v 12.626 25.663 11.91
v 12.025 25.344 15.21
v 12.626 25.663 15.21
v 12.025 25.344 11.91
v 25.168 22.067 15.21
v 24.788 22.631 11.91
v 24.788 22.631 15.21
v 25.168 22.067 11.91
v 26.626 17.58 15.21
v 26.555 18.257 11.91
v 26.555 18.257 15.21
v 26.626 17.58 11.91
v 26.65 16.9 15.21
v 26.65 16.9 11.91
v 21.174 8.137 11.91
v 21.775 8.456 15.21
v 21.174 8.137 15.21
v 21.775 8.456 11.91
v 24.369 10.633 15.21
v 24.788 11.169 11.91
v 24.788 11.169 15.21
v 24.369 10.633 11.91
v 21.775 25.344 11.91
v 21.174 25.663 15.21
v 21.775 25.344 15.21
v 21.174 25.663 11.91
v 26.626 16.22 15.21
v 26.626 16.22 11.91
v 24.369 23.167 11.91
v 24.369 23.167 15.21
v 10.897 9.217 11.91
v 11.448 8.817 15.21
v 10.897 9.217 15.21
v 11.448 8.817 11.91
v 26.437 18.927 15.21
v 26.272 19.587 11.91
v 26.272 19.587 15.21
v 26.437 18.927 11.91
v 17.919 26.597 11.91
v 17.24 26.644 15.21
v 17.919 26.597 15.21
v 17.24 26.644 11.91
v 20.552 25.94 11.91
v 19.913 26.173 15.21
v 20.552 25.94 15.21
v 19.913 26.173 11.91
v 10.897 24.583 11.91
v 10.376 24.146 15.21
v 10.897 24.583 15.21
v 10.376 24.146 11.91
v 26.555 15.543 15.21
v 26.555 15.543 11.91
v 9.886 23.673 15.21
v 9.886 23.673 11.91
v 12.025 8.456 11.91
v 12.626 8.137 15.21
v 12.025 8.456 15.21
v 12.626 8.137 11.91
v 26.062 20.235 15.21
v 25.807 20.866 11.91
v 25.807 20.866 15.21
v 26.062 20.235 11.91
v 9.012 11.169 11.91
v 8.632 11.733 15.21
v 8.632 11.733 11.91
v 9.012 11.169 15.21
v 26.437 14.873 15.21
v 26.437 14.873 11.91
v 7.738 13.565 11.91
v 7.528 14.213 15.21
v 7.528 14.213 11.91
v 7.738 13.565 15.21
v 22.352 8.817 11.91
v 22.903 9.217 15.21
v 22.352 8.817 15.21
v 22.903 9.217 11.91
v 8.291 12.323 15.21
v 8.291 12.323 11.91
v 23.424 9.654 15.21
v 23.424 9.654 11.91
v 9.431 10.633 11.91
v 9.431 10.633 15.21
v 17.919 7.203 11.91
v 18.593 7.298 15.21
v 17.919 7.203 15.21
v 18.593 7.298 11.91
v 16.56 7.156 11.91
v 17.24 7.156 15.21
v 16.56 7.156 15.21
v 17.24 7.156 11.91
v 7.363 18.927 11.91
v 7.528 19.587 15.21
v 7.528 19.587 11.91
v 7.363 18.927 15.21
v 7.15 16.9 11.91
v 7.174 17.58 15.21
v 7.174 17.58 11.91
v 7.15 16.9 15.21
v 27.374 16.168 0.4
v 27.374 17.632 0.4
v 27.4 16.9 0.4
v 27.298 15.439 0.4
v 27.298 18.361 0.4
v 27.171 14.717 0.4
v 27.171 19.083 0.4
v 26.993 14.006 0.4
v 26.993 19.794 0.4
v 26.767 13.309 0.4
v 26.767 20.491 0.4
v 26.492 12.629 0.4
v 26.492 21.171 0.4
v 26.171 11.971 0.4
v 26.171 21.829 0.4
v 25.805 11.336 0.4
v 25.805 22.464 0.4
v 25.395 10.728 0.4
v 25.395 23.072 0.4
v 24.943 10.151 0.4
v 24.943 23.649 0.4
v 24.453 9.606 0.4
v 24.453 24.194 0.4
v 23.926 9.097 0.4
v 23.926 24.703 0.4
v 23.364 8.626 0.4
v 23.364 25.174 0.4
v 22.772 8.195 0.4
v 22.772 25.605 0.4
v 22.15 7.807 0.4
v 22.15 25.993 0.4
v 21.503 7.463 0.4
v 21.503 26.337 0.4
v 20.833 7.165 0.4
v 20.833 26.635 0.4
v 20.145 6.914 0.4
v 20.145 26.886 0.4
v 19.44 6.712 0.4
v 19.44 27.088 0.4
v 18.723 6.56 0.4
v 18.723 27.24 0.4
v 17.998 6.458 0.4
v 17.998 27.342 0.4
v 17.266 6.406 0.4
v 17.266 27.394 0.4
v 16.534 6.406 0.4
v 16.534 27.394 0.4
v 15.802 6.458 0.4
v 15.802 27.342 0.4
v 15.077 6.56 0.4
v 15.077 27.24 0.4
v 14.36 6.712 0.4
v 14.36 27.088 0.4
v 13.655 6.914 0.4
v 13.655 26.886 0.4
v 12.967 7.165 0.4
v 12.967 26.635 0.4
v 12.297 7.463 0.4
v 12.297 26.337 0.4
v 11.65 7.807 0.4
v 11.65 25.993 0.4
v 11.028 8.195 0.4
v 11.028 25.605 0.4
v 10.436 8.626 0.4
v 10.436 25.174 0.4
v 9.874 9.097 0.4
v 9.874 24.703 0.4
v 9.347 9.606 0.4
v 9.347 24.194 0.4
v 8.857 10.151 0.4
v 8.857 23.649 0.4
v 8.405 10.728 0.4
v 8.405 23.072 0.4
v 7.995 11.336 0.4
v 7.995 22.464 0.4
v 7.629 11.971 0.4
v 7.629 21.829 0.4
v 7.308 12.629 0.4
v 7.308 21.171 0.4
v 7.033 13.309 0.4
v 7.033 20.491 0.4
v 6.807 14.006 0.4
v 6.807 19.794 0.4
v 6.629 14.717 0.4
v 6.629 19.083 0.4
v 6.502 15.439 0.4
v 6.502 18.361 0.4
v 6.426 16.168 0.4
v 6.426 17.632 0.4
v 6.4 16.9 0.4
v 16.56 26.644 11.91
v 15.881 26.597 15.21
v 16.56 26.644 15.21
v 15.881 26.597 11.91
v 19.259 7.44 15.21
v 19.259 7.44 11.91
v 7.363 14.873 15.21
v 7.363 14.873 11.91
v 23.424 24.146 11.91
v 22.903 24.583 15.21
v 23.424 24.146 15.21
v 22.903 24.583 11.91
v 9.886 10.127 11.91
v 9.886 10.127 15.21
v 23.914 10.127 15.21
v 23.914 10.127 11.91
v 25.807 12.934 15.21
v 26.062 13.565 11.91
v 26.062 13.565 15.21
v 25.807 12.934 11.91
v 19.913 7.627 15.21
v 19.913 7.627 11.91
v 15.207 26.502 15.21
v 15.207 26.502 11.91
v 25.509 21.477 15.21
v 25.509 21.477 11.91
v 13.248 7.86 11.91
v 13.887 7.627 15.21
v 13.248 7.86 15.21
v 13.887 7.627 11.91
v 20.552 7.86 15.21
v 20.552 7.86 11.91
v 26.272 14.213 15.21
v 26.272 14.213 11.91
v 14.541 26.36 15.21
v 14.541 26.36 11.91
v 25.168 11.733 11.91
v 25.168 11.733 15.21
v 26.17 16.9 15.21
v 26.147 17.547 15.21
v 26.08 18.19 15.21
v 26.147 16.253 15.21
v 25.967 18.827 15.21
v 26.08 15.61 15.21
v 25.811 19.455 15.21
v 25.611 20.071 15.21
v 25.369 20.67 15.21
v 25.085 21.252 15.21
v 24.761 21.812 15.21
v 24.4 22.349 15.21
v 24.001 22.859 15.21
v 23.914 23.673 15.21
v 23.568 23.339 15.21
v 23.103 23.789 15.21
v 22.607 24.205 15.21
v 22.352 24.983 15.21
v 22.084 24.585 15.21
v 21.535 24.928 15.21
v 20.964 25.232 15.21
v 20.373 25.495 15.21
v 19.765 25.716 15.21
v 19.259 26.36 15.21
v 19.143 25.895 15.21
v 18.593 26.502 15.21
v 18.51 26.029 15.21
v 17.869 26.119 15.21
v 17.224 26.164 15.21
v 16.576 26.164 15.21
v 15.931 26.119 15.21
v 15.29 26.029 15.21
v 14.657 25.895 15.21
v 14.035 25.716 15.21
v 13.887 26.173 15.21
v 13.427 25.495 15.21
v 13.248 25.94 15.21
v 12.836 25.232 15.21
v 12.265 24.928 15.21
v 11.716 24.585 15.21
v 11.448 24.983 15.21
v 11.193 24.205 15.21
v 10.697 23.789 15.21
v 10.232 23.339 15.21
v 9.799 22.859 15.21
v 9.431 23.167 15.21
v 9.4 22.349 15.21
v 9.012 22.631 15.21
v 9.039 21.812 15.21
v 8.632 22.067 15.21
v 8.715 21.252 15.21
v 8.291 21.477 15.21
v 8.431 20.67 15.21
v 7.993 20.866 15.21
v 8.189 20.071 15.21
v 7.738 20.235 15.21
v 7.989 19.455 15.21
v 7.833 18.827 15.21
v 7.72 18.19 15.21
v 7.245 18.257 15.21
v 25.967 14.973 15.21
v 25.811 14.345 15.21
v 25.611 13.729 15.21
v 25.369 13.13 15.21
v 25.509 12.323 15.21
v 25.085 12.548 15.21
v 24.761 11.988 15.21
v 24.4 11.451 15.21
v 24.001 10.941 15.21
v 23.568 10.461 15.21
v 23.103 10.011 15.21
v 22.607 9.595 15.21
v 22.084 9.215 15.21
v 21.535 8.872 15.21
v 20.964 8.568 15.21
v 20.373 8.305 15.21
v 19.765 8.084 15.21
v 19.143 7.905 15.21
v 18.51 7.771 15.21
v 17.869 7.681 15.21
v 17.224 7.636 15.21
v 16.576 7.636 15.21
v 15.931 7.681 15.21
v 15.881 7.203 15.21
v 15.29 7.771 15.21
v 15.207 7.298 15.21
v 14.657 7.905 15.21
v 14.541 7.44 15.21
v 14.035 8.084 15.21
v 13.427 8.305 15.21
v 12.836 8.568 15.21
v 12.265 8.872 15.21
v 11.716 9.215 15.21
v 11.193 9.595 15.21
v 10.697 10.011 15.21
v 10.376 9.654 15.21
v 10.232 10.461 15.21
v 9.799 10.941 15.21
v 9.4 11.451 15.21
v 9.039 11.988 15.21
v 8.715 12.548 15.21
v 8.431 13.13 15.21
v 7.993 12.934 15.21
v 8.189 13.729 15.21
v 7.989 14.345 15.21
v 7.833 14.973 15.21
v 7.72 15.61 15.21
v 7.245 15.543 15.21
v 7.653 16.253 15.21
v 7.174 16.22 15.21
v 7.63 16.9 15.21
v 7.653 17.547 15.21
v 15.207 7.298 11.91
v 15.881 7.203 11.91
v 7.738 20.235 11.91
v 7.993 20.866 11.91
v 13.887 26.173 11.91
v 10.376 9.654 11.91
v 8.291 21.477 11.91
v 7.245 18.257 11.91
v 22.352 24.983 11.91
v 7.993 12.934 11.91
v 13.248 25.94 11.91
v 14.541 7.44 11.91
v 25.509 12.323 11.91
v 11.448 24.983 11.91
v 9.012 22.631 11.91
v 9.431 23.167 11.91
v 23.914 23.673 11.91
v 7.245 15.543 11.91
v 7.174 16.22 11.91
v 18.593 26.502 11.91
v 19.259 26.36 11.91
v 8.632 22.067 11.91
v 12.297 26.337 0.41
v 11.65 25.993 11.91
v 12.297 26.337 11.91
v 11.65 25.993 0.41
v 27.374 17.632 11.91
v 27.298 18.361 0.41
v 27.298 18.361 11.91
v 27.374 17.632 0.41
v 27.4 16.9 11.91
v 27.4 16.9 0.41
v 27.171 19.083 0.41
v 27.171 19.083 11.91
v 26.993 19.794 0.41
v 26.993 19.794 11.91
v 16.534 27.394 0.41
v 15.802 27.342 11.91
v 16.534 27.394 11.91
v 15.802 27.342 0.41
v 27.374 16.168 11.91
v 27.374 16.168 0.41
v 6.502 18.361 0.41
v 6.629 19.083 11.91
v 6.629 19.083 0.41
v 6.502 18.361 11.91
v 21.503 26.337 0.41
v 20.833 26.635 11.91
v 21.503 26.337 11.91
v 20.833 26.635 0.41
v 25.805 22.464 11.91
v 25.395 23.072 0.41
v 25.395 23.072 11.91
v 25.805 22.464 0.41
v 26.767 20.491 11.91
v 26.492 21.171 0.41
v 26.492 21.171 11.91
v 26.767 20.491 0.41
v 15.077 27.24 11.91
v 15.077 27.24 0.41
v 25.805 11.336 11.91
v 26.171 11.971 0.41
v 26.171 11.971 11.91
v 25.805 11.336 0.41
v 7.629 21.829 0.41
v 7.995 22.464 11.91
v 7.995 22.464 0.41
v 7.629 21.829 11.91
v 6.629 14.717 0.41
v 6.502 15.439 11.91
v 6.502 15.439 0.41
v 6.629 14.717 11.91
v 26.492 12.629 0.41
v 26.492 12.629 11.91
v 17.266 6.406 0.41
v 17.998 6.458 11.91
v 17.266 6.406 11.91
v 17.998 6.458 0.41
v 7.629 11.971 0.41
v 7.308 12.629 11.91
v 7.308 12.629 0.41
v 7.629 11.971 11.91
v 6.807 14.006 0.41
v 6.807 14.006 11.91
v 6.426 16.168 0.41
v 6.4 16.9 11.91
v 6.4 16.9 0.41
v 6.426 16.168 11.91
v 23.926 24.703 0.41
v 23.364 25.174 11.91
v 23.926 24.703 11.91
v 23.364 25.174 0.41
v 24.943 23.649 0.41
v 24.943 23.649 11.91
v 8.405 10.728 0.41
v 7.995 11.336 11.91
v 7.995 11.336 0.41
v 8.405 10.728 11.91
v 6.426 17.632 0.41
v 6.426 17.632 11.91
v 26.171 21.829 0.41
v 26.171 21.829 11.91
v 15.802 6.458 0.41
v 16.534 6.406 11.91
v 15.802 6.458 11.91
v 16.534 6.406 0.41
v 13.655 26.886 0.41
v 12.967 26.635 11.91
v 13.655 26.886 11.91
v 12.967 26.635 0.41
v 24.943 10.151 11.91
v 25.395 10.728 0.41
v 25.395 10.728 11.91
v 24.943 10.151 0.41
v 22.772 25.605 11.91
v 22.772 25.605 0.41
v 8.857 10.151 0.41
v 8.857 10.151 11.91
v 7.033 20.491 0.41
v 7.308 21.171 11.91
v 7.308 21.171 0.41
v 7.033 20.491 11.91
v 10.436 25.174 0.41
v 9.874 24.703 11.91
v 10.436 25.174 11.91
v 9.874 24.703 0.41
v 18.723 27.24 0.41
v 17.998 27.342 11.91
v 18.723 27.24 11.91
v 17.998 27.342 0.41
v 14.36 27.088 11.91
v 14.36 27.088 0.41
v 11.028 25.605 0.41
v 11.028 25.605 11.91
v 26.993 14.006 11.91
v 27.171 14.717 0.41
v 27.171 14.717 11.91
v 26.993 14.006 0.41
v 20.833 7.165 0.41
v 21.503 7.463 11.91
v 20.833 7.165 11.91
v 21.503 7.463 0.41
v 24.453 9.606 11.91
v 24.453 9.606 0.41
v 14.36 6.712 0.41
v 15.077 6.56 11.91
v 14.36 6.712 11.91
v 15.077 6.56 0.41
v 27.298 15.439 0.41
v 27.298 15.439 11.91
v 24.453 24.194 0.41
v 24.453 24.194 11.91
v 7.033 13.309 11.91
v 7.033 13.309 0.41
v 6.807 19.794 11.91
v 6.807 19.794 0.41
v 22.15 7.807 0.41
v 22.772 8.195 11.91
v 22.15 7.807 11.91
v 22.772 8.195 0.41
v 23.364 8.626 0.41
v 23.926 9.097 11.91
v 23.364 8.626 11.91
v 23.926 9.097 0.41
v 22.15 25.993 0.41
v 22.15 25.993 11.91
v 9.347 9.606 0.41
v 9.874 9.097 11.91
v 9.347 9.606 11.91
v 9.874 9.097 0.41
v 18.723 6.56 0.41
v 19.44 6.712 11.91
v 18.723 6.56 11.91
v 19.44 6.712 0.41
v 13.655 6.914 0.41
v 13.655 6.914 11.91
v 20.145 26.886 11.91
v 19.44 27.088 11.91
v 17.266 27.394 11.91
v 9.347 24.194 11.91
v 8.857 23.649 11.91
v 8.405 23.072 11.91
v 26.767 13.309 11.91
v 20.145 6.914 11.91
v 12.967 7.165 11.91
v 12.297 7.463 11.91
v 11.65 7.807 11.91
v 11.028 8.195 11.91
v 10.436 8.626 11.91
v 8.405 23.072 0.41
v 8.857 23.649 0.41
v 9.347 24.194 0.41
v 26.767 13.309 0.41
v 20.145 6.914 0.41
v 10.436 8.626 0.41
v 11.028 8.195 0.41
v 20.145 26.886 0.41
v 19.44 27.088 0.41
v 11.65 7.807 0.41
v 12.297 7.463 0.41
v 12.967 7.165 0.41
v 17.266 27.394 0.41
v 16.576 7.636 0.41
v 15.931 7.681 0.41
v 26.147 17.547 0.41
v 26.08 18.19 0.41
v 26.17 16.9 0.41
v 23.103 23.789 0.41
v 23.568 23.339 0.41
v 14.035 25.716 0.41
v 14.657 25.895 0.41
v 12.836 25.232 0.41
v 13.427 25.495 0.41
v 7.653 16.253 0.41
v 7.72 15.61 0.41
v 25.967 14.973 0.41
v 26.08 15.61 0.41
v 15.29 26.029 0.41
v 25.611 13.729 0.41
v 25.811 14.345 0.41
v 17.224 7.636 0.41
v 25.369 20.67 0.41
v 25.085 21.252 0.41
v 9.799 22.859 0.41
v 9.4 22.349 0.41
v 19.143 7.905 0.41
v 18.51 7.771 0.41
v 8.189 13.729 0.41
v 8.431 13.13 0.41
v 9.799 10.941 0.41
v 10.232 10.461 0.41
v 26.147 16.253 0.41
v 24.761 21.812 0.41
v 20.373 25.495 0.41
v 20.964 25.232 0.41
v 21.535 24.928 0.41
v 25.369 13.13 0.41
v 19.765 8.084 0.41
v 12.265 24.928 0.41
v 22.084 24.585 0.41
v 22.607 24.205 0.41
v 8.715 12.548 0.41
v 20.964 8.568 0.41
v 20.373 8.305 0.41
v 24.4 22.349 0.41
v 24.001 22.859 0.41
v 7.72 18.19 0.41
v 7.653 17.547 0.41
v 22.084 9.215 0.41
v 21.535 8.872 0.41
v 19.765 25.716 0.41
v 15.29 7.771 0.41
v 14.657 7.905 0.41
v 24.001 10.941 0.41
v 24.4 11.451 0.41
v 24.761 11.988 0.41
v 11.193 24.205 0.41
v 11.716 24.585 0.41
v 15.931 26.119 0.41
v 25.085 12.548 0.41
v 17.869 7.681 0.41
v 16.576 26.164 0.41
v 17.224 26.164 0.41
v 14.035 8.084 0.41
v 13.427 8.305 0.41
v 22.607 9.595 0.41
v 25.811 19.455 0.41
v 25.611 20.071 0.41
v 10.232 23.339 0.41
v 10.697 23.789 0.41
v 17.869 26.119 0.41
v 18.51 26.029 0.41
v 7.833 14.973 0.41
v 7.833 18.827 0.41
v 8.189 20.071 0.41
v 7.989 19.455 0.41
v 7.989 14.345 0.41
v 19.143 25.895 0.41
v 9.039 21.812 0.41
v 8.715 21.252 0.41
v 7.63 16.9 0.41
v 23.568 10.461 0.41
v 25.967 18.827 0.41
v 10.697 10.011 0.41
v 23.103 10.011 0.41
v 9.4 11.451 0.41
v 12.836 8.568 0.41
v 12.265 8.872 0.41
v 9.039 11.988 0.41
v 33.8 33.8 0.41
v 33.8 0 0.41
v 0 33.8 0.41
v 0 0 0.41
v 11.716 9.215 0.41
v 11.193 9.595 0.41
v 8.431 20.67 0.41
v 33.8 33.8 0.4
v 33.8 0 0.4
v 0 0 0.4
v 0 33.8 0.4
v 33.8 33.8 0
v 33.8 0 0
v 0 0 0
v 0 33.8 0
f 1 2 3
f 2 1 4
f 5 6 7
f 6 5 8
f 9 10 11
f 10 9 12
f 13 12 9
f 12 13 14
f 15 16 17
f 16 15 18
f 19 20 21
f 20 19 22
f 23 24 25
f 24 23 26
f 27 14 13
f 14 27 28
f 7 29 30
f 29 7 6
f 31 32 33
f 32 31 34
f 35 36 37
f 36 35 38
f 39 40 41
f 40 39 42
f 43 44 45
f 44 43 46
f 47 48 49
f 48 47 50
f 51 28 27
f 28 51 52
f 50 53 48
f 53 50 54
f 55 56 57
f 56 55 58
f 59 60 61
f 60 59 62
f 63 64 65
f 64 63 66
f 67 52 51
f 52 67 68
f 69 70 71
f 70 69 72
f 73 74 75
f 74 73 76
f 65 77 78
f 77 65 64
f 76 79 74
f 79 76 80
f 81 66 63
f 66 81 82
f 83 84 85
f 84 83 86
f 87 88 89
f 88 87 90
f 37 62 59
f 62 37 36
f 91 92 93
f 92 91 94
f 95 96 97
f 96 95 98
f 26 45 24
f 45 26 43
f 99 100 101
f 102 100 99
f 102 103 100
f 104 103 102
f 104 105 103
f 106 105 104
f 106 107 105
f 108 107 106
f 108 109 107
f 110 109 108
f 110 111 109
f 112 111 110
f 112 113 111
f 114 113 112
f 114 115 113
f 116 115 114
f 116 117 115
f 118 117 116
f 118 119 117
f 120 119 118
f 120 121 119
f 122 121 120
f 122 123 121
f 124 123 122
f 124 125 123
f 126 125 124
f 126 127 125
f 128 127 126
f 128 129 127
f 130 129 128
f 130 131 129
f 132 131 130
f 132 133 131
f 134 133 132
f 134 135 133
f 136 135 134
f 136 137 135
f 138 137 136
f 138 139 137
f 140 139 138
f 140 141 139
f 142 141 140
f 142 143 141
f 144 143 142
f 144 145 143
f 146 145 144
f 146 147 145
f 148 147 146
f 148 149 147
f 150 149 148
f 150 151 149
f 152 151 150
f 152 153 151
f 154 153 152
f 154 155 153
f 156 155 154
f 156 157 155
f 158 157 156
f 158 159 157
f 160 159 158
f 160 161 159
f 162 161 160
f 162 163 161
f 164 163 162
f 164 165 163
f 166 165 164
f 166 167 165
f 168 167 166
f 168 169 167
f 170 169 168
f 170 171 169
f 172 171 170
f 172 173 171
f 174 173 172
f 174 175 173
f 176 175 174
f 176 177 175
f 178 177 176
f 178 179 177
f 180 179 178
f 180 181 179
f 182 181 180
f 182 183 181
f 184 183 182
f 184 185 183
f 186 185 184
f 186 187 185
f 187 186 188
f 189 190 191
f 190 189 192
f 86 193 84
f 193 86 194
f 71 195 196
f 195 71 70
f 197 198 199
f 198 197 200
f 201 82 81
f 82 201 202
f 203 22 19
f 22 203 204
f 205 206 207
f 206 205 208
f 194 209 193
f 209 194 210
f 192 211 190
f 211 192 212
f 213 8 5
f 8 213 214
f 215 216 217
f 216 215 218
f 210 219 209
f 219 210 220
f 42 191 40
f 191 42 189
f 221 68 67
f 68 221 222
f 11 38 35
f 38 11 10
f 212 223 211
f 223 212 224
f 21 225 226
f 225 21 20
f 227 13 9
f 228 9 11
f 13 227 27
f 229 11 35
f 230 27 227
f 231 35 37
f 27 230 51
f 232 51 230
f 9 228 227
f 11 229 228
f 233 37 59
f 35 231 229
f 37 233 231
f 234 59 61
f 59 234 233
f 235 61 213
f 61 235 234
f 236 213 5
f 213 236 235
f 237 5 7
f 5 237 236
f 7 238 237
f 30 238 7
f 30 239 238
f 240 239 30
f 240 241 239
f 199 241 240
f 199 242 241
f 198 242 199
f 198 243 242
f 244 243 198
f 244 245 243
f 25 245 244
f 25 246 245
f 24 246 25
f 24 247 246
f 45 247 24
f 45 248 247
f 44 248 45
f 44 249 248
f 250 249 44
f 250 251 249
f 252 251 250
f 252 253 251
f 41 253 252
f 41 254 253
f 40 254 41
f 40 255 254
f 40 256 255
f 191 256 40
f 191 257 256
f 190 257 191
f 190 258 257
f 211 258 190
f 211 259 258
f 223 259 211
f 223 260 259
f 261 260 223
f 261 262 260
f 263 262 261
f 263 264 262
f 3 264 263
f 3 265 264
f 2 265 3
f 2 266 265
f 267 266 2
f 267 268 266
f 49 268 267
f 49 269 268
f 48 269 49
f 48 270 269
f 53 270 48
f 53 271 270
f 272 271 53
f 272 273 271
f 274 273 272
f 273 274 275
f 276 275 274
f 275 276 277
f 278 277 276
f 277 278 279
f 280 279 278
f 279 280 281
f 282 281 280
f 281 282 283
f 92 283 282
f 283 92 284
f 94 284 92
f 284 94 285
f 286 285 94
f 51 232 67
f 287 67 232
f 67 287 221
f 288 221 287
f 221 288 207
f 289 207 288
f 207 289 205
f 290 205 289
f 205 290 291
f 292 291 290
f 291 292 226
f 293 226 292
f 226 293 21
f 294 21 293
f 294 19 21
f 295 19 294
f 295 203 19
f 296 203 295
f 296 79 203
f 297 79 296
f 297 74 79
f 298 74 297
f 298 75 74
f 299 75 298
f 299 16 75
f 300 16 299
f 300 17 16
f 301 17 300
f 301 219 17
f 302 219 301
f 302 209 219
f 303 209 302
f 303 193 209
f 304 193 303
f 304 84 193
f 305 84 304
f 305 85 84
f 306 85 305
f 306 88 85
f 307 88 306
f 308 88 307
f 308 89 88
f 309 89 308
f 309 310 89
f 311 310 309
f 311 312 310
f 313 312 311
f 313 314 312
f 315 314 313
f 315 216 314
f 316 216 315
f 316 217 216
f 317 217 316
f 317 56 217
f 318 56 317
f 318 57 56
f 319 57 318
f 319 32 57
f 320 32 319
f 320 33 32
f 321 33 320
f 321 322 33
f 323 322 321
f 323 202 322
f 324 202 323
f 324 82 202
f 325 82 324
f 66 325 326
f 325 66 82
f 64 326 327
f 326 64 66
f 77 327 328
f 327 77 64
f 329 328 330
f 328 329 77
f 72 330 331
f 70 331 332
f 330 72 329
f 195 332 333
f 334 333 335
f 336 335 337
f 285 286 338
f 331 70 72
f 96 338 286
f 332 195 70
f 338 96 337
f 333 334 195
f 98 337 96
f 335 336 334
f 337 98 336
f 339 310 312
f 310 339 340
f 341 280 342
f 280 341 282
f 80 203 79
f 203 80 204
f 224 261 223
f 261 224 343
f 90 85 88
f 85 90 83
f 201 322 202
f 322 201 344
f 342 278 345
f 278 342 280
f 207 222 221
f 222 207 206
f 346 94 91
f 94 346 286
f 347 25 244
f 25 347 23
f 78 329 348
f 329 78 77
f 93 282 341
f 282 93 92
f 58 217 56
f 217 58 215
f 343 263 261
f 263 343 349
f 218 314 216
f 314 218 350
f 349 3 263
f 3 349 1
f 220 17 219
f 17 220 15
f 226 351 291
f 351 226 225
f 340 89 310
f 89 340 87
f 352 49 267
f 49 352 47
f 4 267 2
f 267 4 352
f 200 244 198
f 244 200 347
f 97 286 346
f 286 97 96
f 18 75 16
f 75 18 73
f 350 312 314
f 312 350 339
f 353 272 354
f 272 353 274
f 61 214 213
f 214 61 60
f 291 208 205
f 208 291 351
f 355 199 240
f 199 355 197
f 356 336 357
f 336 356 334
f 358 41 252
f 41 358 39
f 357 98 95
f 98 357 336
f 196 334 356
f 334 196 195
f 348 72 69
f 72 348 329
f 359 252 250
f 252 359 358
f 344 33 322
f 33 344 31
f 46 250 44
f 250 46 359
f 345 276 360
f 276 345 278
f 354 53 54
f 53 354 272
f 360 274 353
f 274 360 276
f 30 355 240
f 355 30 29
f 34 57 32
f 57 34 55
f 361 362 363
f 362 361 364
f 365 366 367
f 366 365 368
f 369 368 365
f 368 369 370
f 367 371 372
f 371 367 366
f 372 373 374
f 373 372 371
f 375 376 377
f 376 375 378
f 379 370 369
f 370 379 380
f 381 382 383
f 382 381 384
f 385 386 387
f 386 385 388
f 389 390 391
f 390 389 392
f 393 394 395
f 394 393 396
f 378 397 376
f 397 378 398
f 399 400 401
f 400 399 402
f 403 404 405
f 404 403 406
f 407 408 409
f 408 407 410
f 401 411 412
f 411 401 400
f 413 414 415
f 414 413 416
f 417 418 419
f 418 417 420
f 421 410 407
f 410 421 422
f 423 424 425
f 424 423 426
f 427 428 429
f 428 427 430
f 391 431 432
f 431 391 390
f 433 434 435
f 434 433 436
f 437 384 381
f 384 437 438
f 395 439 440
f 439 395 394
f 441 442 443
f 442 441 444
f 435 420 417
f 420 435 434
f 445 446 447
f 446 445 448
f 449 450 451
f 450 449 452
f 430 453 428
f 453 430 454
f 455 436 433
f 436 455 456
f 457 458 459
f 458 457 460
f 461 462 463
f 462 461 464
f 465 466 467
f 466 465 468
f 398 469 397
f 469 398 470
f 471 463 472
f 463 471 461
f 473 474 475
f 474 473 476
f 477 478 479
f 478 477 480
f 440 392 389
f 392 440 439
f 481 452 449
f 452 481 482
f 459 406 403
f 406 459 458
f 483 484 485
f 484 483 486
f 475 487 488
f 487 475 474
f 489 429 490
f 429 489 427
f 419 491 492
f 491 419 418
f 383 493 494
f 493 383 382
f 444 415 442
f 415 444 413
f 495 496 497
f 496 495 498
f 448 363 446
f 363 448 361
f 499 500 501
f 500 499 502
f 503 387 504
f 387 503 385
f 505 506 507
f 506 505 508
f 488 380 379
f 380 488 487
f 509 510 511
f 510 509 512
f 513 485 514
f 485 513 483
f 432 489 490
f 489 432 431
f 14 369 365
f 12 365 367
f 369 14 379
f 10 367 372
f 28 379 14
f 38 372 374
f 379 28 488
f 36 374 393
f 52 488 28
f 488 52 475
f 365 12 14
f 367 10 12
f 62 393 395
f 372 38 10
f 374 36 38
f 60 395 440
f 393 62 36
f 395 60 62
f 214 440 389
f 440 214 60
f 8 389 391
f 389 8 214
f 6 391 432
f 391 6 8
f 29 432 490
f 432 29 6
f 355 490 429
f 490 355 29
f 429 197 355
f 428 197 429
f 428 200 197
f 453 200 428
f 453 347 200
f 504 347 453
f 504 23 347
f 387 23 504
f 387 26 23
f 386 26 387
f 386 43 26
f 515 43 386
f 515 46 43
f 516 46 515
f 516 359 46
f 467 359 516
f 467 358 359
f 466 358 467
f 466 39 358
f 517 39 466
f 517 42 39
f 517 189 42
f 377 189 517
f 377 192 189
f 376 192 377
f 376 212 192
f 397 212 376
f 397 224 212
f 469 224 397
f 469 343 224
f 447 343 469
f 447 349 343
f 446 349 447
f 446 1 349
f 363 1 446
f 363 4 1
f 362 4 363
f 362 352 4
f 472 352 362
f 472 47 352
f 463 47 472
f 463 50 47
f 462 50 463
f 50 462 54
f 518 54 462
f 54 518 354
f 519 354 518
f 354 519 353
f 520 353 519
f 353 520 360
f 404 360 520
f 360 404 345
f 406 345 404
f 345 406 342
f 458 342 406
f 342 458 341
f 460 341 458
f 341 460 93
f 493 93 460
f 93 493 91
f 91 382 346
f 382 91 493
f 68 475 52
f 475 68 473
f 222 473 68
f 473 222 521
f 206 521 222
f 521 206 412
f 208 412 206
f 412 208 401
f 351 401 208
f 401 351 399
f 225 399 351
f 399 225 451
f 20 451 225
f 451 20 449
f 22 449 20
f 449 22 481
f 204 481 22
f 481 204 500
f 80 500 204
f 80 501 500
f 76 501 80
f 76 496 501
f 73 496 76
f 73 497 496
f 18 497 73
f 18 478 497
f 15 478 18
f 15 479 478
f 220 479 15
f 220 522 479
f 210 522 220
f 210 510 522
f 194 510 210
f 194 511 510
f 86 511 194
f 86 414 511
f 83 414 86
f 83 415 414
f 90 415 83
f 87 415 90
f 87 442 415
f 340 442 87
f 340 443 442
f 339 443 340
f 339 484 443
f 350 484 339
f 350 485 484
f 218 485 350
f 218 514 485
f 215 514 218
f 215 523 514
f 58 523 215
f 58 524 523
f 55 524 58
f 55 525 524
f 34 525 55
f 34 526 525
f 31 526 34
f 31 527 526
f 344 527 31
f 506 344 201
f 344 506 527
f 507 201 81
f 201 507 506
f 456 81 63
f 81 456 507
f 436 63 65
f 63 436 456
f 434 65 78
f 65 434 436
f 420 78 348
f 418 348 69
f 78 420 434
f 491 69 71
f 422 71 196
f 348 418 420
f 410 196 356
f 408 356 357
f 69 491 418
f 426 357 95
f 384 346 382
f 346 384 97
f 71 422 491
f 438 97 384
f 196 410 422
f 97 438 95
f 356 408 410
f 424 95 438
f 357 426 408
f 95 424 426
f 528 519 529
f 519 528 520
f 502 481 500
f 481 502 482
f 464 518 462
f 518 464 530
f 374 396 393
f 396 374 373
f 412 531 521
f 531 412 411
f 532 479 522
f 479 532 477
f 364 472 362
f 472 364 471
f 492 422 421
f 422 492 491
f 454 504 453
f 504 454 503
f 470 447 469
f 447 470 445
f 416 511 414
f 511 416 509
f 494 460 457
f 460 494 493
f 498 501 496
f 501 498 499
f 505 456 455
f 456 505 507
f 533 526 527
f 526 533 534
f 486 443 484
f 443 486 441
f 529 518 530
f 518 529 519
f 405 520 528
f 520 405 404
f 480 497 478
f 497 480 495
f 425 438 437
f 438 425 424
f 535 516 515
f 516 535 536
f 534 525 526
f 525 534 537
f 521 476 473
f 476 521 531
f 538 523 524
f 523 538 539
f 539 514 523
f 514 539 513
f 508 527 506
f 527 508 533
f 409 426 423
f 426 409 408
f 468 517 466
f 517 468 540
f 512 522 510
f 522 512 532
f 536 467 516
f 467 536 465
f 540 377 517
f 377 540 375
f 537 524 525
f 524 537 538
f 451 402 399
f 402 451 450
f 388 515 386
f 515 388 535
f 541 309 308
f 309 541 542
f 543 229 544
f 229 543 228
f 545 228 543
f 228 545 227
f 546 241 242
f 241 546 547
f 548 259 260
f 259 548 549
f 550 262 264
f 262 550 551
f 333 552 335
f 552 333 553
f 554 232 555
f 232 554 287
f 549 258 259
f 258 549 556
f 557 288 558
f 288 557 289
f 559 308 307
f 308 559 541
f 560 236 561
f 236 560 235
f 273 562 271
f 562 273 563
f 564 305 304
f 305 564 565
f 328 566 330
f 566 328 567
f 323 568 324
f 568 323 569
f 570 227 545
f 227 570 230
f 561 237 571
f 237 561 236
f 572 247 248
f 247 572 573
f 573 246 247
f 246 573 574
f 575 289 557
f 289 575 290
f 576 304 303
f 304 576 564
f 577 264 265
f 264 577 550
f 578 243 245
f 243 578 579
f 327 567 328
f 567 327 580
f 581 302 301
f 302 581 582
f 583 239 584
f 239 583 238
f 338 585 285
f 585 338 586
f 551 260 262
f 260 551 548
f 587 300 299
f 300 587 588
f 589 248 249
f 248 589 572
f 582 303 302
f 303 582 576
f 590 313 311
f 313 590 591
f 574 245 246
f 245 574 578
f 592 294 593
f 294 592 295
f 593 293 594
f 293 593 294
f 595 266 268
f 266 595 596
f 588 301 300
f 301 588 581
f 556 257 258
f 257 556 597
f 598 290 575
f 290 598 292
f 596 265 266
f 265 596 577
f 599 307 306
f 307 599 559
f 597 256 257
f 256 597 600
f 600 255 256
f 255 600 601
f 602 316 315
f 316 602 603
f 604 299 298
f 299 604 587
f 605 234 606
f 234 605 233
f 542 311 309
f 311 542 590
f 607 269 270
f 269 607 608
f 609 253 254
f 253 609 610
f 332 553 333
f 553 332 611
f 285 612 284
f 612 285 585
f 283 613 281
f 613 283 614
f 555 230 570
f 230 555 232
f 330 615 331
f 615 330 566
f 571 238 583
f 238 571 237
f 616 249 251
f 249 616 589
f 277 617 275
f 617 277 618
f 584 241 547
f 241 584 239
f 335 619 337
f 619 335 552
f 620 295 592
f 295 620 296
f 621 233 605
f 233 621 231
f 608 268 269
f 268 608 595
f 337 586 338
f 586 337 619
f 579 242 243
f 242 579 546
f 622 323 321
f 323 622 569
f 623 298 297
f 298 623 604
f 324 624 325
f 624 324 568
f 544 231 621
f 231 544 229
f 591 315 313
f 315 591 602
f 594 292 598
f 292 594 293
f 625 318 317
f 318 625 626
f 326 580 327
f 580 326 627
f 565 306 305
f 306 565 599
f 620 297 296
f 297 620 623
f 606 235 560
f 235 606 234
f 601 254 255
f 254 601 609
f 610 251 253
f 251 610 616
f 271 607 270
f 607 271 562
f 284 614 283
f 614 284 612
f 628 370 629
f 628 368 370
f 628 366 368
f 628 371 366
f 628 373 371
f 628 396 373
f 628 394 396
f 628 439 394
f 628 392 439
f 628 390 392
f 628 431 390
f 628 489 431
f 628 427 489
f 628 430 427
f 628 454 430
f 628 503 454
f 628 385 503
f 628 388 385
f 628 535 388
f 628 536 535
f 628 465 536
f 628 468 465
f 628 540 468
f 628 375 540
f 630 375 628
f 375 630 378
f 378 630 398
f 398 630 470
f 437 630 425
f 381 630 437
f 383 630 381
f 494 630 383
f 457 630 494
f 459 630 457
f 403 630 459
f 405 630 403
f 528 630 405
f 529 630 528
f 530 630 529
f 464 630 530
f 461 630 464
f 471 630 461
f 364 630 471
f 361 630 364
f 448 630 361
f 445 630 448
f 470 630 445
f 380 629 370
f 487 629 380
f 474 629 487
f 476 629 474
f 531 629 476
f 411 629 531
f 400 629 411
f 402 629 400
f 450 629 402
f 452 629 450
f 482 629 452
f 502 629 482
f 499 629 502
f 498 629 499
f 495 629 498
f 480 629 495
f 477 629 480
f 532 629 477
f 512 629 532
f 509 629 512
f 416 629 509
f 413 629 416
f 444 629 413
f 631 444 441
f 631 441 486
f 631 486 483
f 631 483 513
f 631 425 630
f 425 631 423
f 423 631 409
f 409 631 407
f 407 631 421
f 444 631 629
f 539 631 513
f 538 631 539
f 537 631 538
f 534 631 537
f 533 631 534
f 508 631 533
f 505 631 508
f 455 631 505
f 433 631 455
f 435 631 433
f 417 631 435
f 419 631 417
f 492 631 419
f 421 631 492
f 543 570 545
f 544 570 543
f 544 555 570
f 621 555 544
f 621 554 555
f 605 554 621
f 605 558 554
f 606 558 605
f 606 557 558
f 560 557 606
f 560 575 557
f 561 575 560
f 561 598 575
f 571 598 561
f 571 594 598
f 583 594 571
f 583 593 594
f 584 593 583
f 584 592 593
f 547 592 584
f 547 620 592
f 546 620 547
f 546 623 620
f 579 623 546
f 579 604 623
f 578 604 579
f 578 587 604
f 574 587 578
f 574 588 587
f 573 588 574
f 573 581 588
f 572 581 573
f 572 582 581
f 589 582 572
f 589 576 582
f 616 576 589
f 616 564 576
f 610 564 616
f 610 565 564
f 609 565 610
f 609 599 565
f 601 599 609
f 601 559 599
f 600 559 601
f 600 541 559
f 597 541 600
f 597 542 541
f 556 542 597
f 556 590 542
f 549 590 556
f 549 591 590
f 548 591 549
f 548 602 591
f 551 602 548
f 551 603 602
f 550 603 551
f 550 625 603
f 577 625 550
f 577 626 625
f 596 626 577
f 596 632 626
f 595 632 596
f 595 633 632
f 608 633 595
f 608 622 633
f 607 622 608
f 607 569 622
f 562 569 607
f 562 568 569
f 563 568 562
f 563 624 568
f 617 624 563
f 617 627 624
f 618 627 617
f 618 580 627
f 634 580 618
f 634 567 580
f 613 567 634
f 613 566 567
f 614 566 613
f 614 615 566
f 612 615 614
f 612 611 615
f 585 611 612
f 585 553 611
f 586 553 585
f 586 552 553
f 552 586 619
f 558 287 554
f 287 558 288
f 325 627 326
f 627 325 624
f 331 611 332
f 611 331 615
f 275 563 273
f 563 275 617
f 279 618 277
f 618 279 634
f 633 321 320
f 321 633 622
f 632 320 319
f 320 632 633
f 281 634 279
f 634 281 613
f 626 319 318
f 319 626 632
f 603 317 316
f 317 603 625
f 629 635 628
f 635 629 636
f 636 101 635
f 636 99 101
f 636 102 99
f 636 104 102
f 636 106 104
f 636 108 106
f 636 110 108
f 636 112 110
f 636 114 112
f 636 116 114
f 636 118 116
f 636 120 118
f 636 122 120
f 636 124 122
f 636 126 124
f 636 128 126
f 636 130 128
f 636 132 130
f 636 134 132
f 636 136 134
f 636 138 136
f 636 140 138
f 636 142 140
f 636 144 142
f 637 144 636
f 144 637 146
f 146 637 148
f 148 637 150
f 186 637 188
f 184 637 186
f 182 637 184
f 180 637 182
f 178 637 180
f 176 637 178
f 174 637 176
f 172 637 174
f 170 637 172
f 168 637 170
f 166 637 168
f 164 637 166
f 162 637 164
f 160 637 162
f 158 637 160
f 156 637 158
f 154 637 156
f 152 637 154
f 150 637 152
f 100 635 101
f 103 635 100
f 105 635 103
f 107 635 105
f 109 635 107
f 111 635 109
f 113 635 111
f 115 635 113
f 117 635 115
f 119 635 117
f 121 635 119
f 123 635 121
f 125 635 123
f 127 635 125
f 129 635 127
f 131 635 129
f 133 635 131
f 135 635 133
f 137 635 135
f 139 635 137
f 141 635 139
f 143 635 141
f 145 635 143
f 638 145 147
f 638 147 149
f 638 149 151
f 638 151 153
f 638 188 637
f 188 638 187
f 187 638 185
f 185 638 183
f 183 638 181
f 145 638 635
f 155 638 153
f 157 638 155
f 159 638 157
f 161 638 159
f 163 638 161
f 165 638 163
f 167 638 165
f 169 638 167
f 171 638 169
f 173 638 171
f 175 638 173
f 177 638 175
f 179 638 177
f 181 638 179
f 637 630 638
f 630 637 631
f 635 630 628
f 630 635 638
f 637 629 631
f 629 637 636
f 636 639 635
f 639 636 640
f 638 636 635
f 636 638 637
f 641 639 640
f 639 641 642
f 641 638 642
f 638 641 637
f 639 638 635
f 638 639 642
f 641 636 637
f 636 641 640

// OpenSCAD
// file: ../../Base/PlacementOptions.scad
// Fischertechnik Box Foundation
// Placement Options

// Alignment
NoAlign = 0;
AlignLeft = 1;
AlignBottom = 2;
AlignCenter = 3;
AlignRight = 4;
AlignTop = 5;

// Element rotation degree steps
rotations = [0, -90, -180, -270];

// Rotation
NoRotation = 0;
Rotate0 = 0;
Rotate90 = 1;
Rotate180 = 2;
Rotate270 = 3;

// Docking (seen from above)
NoDock = -1;
DockLeft = 0;
DockTop = 1;
DockRight = 2;
DockCorner = 2;
DockBottom = 3;

// Web corners
LowerLeft = 0;
UpperLeft = 1;
UpperRight = 2;
LowerRight = 3;

// Web position relative to corner
LeftOfCorner = 0;
RightOfCorner = 1;
// file: ../../Base/Boxes.scad
// Fischertechnik Box Foundation
// Pre-designed Boxes

use <Constants.scad>

include <PlacementOptions.scad>

box190Width = 190;
box190Depth = 130;
box130Width = 130;
box130Depth = 95;
boxUsageHeight = 33.9;
boxWallThickness = 2.4;
boxBaseThickness = 1.0;
boxWebWidth = 3.0;

// getBoxWallThickness()
// Gets the wall thickness of a Fischertechnik Box

function getBoxWallThickness() = boxWallThickness;

// Gets the usable height of a fischertechnik box
function getBoxUsageHeight() = boxUsageHeight;

// Gets the thickness of the Fischertechnik box base.
function getBoxBaseThickness() = boxBaseThickness;

// Gets the width of a box web
function getBoxWebWidth() = boxWebWidth;

// Gets the usable inner space of a Box 190 as an x/y-list
function getBox190Space() = [
    box190Width - 2*getBoxWallThickness(), 
    box190Depth - 2*getBoxWallThickness() ];

// Imports the Fischertechnik empty box 130x190 mm and places it at position 0,0
// 190x130 are the outer sizes, the inner space is slightly smaller. Use getBox190Space() to get the inner sizes.
// This module needs the STL file "Fischertechnik Box 130x190.stl" in the library path.
// The box is positioned that the usable inner space is at the 0,0,0 position. The

module Box190() {
    translate([-getBoxWallThickness(),-getBoxWallThickness(),-getBoxBaseThickness()])
        import("Fischertechnik Box 130x190.stl", convexity=3);
}

// Gets the usable inner space of a Box 130 as an x/y-list
function getBox130Space() = [
    box130Width - 2*getBoxWallThickness(), 
    box130Depth - 2*getBoxWallThickness() ];

// Imports the Fischertechnik empty box 95x130 mm and places it at position 0,0
// 190x130 are the outer sizes, the inner space is slightly smaller. Use getBox190Space() to get the inner sizes.
// This module needs the STL file "Fischertechnik Box 95x130.stl" in the library path.
// The box is positioned that the usable inner space is at the 0,0,0 position. The

module Box130() {
    translate([-getBoxWallThickness(),-getBoxWallThickness(),-getBoxBaseThickness()])
        import("Fischertechnik Box 95x130.stl", convexity=3);
}

// Creates a web at the specified box walls
// corner 0 = LowerLeft, 1 = UpperLeft, 2 = UpperRight, 3 = LowerRight
// side 0 = LeftOfCorner, 1 = RightOfCorner
// distance = Distance in mm from the corner
// box = inner width and depth of the box (default: Box 190)
// webWidth = length of the web (default is 3 mms)
// webThickness = thickness of the web (default is 1 mm)

module BoxWeb(corner, side, distance, box=getBox190Space(), webWidth=getBoxWebWidth(), webThickness=1.0) {
    sink = getBoxWallThickness()/2;

    width = (corner % 2 == 0) ? 
            (side == LeftOfCorner ? webWidth : webThickness) :
            (side == LeftOfCorner ? webThickness : webWidth);

    depth = (corner % 2 == 0) ? 
            (side == RightOfCorner ? webWidth : webThickness) :
            (side == RightOfCorner ? webThickness : webWidth);
    
    xDiff = corner == LowerLeft ? 
                (side == LeftOfCorner ? -sink : distance) :
            (corner == UpperLeft ?                
                (side == LeftOfCorner ? distance : -sink) :
            (corner == UpperRight ?
                (side == LeftOfCorner ? box.x-webWidth+sink : box.x-distance-webThickness) :
                (side == LeftOfCorner ? box.x-distance-webThickness: box.x-webWidth+sink)));

    yDiff = corner == LowerLeft ? 
                (side == RightOfCorner ? -sink : distance) :
            (corner == UpperLeft ?
                (side == RightOfCorner ? box.y-distance : box.y-webWidth+sink) :
            (corner == UpperRight ?
                (side == RightOfCorner ? box.y-webWidth+sink : box.y-distance) :
                (side == RightOfCorner ? distance : -sink)));
    
    translate([xDiff, yDiff, -getExcess()])
        cube([width, depth, boxUsageHeight + 2*getExcess()]);
}
// file: ../../Base/Rotation.scad
// Fischertechnik Box Foundation
// Geometry Helpers Rotation

include <PlacementOptions.scad>

// getRotatedSpace(space, rotation=NoRotation)
// Rotates the space dependent on the specified rotation

function getRotatedSpace(space, rotation=NoRotation) = [
    (rotation == Rotate90 || rotation == Rotate270) ? space.y : space.x,
    (rotation == Rotate90 || rotation == Rotate270) ? space.x : space.y
];

// Rotates the given space around the fixed left lower corner
// space = the space the children needs as width/depth list [width,depth]
// rotation = 0 Rotate0 degrees, 1 Rotate90 degrees, 2 Rotate180 degrees, 3 Rotate270 degrees (equivalent to -90)

module RotateFix(space, rotation=Rotate0) {
    dy = (rotation == Rotate0 || rotation == Rotate270) ? 0 :
        (rotation == Rotate90) ? space.x :
        space.y;
    dx = (rotation < Rotate180) ? 0 :
        (rotation == Rotate180) ? space.x :
        space.y;
    
    translate([dx, dy, 0])
        rotate([0, 0, rotations[rotation]])
            children();
}
// file: ../../Base/Alignment.scad
// Fischertechnik Box Foundation
// Geometry Helpers Alignment

include <PlacementOptions.scad>

// getAlignedX(elementWidth, spaceWidth, align=AlignRight, offset=0)
// Gets the aligned X offset of an element with the given
// width in the given space.
// elementWidth = The width of the element to positon
// spaceWidth = The space where the element should be aligned
// align = 0 AlignLeft, 1 AlignCenter, 2 AlignRight
// offset = an optional offset from the aligned position. When
// aligned left or centered, then positive values are in X direction.
// When aligned right then positive values are in negative X direction.

function getAlignedX(elementWidth, spaceWidth, align=AlignRight, offset=0) =
    (align == AlignLeft) ?
        offset :
        ((align == AlignCenter) ?
        (spaceWidth - elementWidth)/2 + offset :
        spaceWidth - offset - elementWidth);

// getAlignedY(elementDepth, spaceDepth, align=AlignTop, offset=0)
// Gets the aligned Y offset of an element with the given
// depth in the given space.
// elementDepth = The depth of the element to positon
// spaceDepth = The space where the element should be aligned
// align = 0 AlignBottom, 1 AlignCenter, 2 AlignTop
// offset = an optional offset from the aligned position. When
// aligned bottom or centered, then positive values are in Y direction.
// When aligned top then positive values are in negative Y direction.

function getAlignedY(elementDepth, spaceDepth, align=AlignTop, offset=0) =
    (align == AlignBottom) ?
        offset :
        ((align == AlignCenter) ?
        (spaceDepth - elementDepth)/2 + offset :
        spaceDepth - offset - elementDepth);
// file: ../../Base/Placement.scad
// Fischertechnik Box Foundation
// Geometry Helpers Placement

use <Constants.scad>
use <Alignment.scad>
use <Rotation.scad>
use <Boxes.scad>

include <PlacementOptions.scad>

// Place(x=0, y=0, elementSpace=[0,0], alignX=AlignLeft, alignY=AlignBottom, rotation=Rotate0, boxSpace=getBox190Space())
// Places the child at the specified position
// y = Y-Position. This is a relative position when an X aligment is specified.
// x = X-Position. This is a relative position when an Y aligment is specified.
// elementSpace = space of the element to be placed [x,y]
// alignX = -1=NoAlign, 0 AlignLeft, 1 AlignCenter, 3 AlignRight (elementSpace and boxSpace required!)
// alignY = -1=NoAlign, 2 AlignBottom, 1 AlignCenter, 4 AlignTop (elementSpace and boxSpace required!)
// rotation = 0 Rotate0 0 degrees, 1 Rotate90 90 degrees, 
// 2 Rotate180 180 degrees, 3 Rotate270 270 degrees (equivalent to -90)
// boxSpace = Inner space of the box where the placement occurs [x,y] - default is Box 190x130 inner space

module Place(x=0, y=0, elementSpace=[0,0], 
  alignX=AlignLeft, alignY=AlignBottom, 
  rotation=NoRotation, boxSpace=getBox190Space()) {

    module Position(x, y, space, rotation=Rotate0) {
        translate([x, y, 0])
            RotateFix(space, rotation)
                children();
    }

    space = getRotatedSpace(elementSpace, rotation);
    alignedX = getAlignedX(space.x, boxSpace.x, alignX, x);
    alignedY = getAlignedY(space.y, boxSpace.y, alignY, y);
    Position(alignedX, alignedY, elementSpace, rotation)
        children();
}

// Center(space=getBox130Space(), elementSpace=[0,0])
// space = Space where the children is centered. For cylinder use centered=true and no elementSpace.
// elementSpace = space of the element to be centered [x,y]

module Center(space=getBox190Space(), elementSpace=[0,0]) {
    translate([(space.x - elementSpace.x) / 2, (space.y - elementSpace.y) / 2])
        children(0);
}

// CenterHorizontal(width=0, y=0, offset=0, space=getBox130Space())
// space = Space where the children is centered. For cylinder use centered=true and no elementSpace.
// elementSpace = space of the element to be centered [x,y]

module CenterHorizontal(width=0, y=0, offset=0, space=getBox190Space()) {
    translate([(space.x - width) / 2 + offset, y])
        children(0);
}

// CenterVertical(depth=0, x=0, offset=0, space=getBox130Space())
// space = Space where the children is centered. For cylinder use centered=true and no elementSpace.
// elementSpace = space of the element to be centered [x,y]

module CenterVertical(depth=0, x=0, offset=0, space=getBox190Space()) {
    translate([x, (space.y - depth) / 2 + offset])
        children(0);
}
// file: ../../Elements/AxisClip10.scad
// Fischertechnik Box Library
// Axis for clip 10
// 31023

use <../ModelBase/Simple.scad>

width = 12;
depth = 12;
height = 23;

// getAxisClip10Space()
// Gets the space of a frame for a clip 10 with spring ring (mot2)

function getAxisClip10Space() = [width, depth, height];

// AxisClip10()
// Axis for clip 10 with spring ring (mot2)

module AxisClip10() {
    LeveledAxisWithSpace(height, height-10, getAxisClip10Space());
}

// Tests
color("lightgray")
AxisClip10();
// file: ../../Base/Constants.scad
// Fischertechnik Box Foundation
// Constants

// Constant values necessary for multiple elements

// Base constants
dividerThickness = 1.2;
excess = 0.01;
fragments = 90;
tolerance = 0.8;

// Gets the thickness of a divider 
function getDividerThickness() = dividerThickness;

// Gets the excess that is used to merge walls into each other
function getExcess() = excess;

// Gets amount of fragments of a cylinder
function getFragments() = fragments;

// Gets the inner tolerance of a frame to each side
function getTolerance() = tolerance;


// Fischertechnik specific constants
axisDiameter = 4;
axisBottomDiameter = axisDiameter + 1;
standardEdgeDistance = 2.5;
standardWebDistance = 11.5;
standardCornerLength = 15;
tubeWallFactor = 0.8;

// Gets axis diameter
function getAxisDiameter() = axisDiameter;

// Gets axis bottom diameter for thicker part at the bottom
function getAxisBottomDiameter() = axisBottomDiameter;

// gets the standard distance to the wall of the box for dockable frames with webs
function getStandardEdgeDistance() = standardEdgeDistance;

// gets the standard distance of each web to the corner of the dockable frame
function getStandardWebDistance() = standardWebDistance;

// gets the standard length of the corner walls of a dockable frame
function getStandardCornerLength() = standardCornerLength;

// gets the wall thickness of a tube.
function getTubeWallThickness() = tubeWallFactor * getDividerThickness();
// file: ../../Elements/CylinderGearZ20.scad
// Fischertechnik Box Library
// Cylinder for Gear Z20
// 31021

use <../Base/Constants.scad>
use <../Base/Placement.scad>
use <../ModelBase/Simple.scad>

depth = 33.8;
width = 33.8;
height = 14.8;
levelHeight = 11.5;

function getCylinderGearZ20Height() = height;
function getCylinderGearZ20LevelHeight() = levelHeight;

// getCylinderGearZ20Space()
// Gets the space the cylinder gear needs as width and depth (.x and .y as a list)

function getCylinderGearZ20Space() = [width, depth];

// CylinderGear()
// Standing cylinder for gear wheel Z20

module CylinderGearZ20() {
    diameter = 19.5;
    levelDiameter = 21;

    Space(getCylinderGearZ20Space());
        
    Center(getCylinderGearZ20Space())
        LeveledTube(getCylinderGearZ20Height(), diameter, getCylinderGearZ20LevelHeight(), levelDiameter);
}

// Tests
color("lightgray")
CylinderGearZ20();
// file: ../TestPrint.scad
// 3D Print Test Base

use <../Base/Constants.scad>

use <../Elements/AxisClip10.scad>

module TestPrint(elementSpace) {
    cube([elementSpace.x, elementSpace.y, 0.4]);
    translate([0,0,0.4+getExcess()]) {
        children();
    }
}

TestPrint(getAxisClip10Space())
    AxisClip10();
// main file
// 3D Print Test
// CylinderGearZ20

use <../TestPrint.scad>
use <../../Elements/CylinderGearZ20.scad>

TestPrint(getCylinderGearZ20Space())
    CylinderGearZ20();
